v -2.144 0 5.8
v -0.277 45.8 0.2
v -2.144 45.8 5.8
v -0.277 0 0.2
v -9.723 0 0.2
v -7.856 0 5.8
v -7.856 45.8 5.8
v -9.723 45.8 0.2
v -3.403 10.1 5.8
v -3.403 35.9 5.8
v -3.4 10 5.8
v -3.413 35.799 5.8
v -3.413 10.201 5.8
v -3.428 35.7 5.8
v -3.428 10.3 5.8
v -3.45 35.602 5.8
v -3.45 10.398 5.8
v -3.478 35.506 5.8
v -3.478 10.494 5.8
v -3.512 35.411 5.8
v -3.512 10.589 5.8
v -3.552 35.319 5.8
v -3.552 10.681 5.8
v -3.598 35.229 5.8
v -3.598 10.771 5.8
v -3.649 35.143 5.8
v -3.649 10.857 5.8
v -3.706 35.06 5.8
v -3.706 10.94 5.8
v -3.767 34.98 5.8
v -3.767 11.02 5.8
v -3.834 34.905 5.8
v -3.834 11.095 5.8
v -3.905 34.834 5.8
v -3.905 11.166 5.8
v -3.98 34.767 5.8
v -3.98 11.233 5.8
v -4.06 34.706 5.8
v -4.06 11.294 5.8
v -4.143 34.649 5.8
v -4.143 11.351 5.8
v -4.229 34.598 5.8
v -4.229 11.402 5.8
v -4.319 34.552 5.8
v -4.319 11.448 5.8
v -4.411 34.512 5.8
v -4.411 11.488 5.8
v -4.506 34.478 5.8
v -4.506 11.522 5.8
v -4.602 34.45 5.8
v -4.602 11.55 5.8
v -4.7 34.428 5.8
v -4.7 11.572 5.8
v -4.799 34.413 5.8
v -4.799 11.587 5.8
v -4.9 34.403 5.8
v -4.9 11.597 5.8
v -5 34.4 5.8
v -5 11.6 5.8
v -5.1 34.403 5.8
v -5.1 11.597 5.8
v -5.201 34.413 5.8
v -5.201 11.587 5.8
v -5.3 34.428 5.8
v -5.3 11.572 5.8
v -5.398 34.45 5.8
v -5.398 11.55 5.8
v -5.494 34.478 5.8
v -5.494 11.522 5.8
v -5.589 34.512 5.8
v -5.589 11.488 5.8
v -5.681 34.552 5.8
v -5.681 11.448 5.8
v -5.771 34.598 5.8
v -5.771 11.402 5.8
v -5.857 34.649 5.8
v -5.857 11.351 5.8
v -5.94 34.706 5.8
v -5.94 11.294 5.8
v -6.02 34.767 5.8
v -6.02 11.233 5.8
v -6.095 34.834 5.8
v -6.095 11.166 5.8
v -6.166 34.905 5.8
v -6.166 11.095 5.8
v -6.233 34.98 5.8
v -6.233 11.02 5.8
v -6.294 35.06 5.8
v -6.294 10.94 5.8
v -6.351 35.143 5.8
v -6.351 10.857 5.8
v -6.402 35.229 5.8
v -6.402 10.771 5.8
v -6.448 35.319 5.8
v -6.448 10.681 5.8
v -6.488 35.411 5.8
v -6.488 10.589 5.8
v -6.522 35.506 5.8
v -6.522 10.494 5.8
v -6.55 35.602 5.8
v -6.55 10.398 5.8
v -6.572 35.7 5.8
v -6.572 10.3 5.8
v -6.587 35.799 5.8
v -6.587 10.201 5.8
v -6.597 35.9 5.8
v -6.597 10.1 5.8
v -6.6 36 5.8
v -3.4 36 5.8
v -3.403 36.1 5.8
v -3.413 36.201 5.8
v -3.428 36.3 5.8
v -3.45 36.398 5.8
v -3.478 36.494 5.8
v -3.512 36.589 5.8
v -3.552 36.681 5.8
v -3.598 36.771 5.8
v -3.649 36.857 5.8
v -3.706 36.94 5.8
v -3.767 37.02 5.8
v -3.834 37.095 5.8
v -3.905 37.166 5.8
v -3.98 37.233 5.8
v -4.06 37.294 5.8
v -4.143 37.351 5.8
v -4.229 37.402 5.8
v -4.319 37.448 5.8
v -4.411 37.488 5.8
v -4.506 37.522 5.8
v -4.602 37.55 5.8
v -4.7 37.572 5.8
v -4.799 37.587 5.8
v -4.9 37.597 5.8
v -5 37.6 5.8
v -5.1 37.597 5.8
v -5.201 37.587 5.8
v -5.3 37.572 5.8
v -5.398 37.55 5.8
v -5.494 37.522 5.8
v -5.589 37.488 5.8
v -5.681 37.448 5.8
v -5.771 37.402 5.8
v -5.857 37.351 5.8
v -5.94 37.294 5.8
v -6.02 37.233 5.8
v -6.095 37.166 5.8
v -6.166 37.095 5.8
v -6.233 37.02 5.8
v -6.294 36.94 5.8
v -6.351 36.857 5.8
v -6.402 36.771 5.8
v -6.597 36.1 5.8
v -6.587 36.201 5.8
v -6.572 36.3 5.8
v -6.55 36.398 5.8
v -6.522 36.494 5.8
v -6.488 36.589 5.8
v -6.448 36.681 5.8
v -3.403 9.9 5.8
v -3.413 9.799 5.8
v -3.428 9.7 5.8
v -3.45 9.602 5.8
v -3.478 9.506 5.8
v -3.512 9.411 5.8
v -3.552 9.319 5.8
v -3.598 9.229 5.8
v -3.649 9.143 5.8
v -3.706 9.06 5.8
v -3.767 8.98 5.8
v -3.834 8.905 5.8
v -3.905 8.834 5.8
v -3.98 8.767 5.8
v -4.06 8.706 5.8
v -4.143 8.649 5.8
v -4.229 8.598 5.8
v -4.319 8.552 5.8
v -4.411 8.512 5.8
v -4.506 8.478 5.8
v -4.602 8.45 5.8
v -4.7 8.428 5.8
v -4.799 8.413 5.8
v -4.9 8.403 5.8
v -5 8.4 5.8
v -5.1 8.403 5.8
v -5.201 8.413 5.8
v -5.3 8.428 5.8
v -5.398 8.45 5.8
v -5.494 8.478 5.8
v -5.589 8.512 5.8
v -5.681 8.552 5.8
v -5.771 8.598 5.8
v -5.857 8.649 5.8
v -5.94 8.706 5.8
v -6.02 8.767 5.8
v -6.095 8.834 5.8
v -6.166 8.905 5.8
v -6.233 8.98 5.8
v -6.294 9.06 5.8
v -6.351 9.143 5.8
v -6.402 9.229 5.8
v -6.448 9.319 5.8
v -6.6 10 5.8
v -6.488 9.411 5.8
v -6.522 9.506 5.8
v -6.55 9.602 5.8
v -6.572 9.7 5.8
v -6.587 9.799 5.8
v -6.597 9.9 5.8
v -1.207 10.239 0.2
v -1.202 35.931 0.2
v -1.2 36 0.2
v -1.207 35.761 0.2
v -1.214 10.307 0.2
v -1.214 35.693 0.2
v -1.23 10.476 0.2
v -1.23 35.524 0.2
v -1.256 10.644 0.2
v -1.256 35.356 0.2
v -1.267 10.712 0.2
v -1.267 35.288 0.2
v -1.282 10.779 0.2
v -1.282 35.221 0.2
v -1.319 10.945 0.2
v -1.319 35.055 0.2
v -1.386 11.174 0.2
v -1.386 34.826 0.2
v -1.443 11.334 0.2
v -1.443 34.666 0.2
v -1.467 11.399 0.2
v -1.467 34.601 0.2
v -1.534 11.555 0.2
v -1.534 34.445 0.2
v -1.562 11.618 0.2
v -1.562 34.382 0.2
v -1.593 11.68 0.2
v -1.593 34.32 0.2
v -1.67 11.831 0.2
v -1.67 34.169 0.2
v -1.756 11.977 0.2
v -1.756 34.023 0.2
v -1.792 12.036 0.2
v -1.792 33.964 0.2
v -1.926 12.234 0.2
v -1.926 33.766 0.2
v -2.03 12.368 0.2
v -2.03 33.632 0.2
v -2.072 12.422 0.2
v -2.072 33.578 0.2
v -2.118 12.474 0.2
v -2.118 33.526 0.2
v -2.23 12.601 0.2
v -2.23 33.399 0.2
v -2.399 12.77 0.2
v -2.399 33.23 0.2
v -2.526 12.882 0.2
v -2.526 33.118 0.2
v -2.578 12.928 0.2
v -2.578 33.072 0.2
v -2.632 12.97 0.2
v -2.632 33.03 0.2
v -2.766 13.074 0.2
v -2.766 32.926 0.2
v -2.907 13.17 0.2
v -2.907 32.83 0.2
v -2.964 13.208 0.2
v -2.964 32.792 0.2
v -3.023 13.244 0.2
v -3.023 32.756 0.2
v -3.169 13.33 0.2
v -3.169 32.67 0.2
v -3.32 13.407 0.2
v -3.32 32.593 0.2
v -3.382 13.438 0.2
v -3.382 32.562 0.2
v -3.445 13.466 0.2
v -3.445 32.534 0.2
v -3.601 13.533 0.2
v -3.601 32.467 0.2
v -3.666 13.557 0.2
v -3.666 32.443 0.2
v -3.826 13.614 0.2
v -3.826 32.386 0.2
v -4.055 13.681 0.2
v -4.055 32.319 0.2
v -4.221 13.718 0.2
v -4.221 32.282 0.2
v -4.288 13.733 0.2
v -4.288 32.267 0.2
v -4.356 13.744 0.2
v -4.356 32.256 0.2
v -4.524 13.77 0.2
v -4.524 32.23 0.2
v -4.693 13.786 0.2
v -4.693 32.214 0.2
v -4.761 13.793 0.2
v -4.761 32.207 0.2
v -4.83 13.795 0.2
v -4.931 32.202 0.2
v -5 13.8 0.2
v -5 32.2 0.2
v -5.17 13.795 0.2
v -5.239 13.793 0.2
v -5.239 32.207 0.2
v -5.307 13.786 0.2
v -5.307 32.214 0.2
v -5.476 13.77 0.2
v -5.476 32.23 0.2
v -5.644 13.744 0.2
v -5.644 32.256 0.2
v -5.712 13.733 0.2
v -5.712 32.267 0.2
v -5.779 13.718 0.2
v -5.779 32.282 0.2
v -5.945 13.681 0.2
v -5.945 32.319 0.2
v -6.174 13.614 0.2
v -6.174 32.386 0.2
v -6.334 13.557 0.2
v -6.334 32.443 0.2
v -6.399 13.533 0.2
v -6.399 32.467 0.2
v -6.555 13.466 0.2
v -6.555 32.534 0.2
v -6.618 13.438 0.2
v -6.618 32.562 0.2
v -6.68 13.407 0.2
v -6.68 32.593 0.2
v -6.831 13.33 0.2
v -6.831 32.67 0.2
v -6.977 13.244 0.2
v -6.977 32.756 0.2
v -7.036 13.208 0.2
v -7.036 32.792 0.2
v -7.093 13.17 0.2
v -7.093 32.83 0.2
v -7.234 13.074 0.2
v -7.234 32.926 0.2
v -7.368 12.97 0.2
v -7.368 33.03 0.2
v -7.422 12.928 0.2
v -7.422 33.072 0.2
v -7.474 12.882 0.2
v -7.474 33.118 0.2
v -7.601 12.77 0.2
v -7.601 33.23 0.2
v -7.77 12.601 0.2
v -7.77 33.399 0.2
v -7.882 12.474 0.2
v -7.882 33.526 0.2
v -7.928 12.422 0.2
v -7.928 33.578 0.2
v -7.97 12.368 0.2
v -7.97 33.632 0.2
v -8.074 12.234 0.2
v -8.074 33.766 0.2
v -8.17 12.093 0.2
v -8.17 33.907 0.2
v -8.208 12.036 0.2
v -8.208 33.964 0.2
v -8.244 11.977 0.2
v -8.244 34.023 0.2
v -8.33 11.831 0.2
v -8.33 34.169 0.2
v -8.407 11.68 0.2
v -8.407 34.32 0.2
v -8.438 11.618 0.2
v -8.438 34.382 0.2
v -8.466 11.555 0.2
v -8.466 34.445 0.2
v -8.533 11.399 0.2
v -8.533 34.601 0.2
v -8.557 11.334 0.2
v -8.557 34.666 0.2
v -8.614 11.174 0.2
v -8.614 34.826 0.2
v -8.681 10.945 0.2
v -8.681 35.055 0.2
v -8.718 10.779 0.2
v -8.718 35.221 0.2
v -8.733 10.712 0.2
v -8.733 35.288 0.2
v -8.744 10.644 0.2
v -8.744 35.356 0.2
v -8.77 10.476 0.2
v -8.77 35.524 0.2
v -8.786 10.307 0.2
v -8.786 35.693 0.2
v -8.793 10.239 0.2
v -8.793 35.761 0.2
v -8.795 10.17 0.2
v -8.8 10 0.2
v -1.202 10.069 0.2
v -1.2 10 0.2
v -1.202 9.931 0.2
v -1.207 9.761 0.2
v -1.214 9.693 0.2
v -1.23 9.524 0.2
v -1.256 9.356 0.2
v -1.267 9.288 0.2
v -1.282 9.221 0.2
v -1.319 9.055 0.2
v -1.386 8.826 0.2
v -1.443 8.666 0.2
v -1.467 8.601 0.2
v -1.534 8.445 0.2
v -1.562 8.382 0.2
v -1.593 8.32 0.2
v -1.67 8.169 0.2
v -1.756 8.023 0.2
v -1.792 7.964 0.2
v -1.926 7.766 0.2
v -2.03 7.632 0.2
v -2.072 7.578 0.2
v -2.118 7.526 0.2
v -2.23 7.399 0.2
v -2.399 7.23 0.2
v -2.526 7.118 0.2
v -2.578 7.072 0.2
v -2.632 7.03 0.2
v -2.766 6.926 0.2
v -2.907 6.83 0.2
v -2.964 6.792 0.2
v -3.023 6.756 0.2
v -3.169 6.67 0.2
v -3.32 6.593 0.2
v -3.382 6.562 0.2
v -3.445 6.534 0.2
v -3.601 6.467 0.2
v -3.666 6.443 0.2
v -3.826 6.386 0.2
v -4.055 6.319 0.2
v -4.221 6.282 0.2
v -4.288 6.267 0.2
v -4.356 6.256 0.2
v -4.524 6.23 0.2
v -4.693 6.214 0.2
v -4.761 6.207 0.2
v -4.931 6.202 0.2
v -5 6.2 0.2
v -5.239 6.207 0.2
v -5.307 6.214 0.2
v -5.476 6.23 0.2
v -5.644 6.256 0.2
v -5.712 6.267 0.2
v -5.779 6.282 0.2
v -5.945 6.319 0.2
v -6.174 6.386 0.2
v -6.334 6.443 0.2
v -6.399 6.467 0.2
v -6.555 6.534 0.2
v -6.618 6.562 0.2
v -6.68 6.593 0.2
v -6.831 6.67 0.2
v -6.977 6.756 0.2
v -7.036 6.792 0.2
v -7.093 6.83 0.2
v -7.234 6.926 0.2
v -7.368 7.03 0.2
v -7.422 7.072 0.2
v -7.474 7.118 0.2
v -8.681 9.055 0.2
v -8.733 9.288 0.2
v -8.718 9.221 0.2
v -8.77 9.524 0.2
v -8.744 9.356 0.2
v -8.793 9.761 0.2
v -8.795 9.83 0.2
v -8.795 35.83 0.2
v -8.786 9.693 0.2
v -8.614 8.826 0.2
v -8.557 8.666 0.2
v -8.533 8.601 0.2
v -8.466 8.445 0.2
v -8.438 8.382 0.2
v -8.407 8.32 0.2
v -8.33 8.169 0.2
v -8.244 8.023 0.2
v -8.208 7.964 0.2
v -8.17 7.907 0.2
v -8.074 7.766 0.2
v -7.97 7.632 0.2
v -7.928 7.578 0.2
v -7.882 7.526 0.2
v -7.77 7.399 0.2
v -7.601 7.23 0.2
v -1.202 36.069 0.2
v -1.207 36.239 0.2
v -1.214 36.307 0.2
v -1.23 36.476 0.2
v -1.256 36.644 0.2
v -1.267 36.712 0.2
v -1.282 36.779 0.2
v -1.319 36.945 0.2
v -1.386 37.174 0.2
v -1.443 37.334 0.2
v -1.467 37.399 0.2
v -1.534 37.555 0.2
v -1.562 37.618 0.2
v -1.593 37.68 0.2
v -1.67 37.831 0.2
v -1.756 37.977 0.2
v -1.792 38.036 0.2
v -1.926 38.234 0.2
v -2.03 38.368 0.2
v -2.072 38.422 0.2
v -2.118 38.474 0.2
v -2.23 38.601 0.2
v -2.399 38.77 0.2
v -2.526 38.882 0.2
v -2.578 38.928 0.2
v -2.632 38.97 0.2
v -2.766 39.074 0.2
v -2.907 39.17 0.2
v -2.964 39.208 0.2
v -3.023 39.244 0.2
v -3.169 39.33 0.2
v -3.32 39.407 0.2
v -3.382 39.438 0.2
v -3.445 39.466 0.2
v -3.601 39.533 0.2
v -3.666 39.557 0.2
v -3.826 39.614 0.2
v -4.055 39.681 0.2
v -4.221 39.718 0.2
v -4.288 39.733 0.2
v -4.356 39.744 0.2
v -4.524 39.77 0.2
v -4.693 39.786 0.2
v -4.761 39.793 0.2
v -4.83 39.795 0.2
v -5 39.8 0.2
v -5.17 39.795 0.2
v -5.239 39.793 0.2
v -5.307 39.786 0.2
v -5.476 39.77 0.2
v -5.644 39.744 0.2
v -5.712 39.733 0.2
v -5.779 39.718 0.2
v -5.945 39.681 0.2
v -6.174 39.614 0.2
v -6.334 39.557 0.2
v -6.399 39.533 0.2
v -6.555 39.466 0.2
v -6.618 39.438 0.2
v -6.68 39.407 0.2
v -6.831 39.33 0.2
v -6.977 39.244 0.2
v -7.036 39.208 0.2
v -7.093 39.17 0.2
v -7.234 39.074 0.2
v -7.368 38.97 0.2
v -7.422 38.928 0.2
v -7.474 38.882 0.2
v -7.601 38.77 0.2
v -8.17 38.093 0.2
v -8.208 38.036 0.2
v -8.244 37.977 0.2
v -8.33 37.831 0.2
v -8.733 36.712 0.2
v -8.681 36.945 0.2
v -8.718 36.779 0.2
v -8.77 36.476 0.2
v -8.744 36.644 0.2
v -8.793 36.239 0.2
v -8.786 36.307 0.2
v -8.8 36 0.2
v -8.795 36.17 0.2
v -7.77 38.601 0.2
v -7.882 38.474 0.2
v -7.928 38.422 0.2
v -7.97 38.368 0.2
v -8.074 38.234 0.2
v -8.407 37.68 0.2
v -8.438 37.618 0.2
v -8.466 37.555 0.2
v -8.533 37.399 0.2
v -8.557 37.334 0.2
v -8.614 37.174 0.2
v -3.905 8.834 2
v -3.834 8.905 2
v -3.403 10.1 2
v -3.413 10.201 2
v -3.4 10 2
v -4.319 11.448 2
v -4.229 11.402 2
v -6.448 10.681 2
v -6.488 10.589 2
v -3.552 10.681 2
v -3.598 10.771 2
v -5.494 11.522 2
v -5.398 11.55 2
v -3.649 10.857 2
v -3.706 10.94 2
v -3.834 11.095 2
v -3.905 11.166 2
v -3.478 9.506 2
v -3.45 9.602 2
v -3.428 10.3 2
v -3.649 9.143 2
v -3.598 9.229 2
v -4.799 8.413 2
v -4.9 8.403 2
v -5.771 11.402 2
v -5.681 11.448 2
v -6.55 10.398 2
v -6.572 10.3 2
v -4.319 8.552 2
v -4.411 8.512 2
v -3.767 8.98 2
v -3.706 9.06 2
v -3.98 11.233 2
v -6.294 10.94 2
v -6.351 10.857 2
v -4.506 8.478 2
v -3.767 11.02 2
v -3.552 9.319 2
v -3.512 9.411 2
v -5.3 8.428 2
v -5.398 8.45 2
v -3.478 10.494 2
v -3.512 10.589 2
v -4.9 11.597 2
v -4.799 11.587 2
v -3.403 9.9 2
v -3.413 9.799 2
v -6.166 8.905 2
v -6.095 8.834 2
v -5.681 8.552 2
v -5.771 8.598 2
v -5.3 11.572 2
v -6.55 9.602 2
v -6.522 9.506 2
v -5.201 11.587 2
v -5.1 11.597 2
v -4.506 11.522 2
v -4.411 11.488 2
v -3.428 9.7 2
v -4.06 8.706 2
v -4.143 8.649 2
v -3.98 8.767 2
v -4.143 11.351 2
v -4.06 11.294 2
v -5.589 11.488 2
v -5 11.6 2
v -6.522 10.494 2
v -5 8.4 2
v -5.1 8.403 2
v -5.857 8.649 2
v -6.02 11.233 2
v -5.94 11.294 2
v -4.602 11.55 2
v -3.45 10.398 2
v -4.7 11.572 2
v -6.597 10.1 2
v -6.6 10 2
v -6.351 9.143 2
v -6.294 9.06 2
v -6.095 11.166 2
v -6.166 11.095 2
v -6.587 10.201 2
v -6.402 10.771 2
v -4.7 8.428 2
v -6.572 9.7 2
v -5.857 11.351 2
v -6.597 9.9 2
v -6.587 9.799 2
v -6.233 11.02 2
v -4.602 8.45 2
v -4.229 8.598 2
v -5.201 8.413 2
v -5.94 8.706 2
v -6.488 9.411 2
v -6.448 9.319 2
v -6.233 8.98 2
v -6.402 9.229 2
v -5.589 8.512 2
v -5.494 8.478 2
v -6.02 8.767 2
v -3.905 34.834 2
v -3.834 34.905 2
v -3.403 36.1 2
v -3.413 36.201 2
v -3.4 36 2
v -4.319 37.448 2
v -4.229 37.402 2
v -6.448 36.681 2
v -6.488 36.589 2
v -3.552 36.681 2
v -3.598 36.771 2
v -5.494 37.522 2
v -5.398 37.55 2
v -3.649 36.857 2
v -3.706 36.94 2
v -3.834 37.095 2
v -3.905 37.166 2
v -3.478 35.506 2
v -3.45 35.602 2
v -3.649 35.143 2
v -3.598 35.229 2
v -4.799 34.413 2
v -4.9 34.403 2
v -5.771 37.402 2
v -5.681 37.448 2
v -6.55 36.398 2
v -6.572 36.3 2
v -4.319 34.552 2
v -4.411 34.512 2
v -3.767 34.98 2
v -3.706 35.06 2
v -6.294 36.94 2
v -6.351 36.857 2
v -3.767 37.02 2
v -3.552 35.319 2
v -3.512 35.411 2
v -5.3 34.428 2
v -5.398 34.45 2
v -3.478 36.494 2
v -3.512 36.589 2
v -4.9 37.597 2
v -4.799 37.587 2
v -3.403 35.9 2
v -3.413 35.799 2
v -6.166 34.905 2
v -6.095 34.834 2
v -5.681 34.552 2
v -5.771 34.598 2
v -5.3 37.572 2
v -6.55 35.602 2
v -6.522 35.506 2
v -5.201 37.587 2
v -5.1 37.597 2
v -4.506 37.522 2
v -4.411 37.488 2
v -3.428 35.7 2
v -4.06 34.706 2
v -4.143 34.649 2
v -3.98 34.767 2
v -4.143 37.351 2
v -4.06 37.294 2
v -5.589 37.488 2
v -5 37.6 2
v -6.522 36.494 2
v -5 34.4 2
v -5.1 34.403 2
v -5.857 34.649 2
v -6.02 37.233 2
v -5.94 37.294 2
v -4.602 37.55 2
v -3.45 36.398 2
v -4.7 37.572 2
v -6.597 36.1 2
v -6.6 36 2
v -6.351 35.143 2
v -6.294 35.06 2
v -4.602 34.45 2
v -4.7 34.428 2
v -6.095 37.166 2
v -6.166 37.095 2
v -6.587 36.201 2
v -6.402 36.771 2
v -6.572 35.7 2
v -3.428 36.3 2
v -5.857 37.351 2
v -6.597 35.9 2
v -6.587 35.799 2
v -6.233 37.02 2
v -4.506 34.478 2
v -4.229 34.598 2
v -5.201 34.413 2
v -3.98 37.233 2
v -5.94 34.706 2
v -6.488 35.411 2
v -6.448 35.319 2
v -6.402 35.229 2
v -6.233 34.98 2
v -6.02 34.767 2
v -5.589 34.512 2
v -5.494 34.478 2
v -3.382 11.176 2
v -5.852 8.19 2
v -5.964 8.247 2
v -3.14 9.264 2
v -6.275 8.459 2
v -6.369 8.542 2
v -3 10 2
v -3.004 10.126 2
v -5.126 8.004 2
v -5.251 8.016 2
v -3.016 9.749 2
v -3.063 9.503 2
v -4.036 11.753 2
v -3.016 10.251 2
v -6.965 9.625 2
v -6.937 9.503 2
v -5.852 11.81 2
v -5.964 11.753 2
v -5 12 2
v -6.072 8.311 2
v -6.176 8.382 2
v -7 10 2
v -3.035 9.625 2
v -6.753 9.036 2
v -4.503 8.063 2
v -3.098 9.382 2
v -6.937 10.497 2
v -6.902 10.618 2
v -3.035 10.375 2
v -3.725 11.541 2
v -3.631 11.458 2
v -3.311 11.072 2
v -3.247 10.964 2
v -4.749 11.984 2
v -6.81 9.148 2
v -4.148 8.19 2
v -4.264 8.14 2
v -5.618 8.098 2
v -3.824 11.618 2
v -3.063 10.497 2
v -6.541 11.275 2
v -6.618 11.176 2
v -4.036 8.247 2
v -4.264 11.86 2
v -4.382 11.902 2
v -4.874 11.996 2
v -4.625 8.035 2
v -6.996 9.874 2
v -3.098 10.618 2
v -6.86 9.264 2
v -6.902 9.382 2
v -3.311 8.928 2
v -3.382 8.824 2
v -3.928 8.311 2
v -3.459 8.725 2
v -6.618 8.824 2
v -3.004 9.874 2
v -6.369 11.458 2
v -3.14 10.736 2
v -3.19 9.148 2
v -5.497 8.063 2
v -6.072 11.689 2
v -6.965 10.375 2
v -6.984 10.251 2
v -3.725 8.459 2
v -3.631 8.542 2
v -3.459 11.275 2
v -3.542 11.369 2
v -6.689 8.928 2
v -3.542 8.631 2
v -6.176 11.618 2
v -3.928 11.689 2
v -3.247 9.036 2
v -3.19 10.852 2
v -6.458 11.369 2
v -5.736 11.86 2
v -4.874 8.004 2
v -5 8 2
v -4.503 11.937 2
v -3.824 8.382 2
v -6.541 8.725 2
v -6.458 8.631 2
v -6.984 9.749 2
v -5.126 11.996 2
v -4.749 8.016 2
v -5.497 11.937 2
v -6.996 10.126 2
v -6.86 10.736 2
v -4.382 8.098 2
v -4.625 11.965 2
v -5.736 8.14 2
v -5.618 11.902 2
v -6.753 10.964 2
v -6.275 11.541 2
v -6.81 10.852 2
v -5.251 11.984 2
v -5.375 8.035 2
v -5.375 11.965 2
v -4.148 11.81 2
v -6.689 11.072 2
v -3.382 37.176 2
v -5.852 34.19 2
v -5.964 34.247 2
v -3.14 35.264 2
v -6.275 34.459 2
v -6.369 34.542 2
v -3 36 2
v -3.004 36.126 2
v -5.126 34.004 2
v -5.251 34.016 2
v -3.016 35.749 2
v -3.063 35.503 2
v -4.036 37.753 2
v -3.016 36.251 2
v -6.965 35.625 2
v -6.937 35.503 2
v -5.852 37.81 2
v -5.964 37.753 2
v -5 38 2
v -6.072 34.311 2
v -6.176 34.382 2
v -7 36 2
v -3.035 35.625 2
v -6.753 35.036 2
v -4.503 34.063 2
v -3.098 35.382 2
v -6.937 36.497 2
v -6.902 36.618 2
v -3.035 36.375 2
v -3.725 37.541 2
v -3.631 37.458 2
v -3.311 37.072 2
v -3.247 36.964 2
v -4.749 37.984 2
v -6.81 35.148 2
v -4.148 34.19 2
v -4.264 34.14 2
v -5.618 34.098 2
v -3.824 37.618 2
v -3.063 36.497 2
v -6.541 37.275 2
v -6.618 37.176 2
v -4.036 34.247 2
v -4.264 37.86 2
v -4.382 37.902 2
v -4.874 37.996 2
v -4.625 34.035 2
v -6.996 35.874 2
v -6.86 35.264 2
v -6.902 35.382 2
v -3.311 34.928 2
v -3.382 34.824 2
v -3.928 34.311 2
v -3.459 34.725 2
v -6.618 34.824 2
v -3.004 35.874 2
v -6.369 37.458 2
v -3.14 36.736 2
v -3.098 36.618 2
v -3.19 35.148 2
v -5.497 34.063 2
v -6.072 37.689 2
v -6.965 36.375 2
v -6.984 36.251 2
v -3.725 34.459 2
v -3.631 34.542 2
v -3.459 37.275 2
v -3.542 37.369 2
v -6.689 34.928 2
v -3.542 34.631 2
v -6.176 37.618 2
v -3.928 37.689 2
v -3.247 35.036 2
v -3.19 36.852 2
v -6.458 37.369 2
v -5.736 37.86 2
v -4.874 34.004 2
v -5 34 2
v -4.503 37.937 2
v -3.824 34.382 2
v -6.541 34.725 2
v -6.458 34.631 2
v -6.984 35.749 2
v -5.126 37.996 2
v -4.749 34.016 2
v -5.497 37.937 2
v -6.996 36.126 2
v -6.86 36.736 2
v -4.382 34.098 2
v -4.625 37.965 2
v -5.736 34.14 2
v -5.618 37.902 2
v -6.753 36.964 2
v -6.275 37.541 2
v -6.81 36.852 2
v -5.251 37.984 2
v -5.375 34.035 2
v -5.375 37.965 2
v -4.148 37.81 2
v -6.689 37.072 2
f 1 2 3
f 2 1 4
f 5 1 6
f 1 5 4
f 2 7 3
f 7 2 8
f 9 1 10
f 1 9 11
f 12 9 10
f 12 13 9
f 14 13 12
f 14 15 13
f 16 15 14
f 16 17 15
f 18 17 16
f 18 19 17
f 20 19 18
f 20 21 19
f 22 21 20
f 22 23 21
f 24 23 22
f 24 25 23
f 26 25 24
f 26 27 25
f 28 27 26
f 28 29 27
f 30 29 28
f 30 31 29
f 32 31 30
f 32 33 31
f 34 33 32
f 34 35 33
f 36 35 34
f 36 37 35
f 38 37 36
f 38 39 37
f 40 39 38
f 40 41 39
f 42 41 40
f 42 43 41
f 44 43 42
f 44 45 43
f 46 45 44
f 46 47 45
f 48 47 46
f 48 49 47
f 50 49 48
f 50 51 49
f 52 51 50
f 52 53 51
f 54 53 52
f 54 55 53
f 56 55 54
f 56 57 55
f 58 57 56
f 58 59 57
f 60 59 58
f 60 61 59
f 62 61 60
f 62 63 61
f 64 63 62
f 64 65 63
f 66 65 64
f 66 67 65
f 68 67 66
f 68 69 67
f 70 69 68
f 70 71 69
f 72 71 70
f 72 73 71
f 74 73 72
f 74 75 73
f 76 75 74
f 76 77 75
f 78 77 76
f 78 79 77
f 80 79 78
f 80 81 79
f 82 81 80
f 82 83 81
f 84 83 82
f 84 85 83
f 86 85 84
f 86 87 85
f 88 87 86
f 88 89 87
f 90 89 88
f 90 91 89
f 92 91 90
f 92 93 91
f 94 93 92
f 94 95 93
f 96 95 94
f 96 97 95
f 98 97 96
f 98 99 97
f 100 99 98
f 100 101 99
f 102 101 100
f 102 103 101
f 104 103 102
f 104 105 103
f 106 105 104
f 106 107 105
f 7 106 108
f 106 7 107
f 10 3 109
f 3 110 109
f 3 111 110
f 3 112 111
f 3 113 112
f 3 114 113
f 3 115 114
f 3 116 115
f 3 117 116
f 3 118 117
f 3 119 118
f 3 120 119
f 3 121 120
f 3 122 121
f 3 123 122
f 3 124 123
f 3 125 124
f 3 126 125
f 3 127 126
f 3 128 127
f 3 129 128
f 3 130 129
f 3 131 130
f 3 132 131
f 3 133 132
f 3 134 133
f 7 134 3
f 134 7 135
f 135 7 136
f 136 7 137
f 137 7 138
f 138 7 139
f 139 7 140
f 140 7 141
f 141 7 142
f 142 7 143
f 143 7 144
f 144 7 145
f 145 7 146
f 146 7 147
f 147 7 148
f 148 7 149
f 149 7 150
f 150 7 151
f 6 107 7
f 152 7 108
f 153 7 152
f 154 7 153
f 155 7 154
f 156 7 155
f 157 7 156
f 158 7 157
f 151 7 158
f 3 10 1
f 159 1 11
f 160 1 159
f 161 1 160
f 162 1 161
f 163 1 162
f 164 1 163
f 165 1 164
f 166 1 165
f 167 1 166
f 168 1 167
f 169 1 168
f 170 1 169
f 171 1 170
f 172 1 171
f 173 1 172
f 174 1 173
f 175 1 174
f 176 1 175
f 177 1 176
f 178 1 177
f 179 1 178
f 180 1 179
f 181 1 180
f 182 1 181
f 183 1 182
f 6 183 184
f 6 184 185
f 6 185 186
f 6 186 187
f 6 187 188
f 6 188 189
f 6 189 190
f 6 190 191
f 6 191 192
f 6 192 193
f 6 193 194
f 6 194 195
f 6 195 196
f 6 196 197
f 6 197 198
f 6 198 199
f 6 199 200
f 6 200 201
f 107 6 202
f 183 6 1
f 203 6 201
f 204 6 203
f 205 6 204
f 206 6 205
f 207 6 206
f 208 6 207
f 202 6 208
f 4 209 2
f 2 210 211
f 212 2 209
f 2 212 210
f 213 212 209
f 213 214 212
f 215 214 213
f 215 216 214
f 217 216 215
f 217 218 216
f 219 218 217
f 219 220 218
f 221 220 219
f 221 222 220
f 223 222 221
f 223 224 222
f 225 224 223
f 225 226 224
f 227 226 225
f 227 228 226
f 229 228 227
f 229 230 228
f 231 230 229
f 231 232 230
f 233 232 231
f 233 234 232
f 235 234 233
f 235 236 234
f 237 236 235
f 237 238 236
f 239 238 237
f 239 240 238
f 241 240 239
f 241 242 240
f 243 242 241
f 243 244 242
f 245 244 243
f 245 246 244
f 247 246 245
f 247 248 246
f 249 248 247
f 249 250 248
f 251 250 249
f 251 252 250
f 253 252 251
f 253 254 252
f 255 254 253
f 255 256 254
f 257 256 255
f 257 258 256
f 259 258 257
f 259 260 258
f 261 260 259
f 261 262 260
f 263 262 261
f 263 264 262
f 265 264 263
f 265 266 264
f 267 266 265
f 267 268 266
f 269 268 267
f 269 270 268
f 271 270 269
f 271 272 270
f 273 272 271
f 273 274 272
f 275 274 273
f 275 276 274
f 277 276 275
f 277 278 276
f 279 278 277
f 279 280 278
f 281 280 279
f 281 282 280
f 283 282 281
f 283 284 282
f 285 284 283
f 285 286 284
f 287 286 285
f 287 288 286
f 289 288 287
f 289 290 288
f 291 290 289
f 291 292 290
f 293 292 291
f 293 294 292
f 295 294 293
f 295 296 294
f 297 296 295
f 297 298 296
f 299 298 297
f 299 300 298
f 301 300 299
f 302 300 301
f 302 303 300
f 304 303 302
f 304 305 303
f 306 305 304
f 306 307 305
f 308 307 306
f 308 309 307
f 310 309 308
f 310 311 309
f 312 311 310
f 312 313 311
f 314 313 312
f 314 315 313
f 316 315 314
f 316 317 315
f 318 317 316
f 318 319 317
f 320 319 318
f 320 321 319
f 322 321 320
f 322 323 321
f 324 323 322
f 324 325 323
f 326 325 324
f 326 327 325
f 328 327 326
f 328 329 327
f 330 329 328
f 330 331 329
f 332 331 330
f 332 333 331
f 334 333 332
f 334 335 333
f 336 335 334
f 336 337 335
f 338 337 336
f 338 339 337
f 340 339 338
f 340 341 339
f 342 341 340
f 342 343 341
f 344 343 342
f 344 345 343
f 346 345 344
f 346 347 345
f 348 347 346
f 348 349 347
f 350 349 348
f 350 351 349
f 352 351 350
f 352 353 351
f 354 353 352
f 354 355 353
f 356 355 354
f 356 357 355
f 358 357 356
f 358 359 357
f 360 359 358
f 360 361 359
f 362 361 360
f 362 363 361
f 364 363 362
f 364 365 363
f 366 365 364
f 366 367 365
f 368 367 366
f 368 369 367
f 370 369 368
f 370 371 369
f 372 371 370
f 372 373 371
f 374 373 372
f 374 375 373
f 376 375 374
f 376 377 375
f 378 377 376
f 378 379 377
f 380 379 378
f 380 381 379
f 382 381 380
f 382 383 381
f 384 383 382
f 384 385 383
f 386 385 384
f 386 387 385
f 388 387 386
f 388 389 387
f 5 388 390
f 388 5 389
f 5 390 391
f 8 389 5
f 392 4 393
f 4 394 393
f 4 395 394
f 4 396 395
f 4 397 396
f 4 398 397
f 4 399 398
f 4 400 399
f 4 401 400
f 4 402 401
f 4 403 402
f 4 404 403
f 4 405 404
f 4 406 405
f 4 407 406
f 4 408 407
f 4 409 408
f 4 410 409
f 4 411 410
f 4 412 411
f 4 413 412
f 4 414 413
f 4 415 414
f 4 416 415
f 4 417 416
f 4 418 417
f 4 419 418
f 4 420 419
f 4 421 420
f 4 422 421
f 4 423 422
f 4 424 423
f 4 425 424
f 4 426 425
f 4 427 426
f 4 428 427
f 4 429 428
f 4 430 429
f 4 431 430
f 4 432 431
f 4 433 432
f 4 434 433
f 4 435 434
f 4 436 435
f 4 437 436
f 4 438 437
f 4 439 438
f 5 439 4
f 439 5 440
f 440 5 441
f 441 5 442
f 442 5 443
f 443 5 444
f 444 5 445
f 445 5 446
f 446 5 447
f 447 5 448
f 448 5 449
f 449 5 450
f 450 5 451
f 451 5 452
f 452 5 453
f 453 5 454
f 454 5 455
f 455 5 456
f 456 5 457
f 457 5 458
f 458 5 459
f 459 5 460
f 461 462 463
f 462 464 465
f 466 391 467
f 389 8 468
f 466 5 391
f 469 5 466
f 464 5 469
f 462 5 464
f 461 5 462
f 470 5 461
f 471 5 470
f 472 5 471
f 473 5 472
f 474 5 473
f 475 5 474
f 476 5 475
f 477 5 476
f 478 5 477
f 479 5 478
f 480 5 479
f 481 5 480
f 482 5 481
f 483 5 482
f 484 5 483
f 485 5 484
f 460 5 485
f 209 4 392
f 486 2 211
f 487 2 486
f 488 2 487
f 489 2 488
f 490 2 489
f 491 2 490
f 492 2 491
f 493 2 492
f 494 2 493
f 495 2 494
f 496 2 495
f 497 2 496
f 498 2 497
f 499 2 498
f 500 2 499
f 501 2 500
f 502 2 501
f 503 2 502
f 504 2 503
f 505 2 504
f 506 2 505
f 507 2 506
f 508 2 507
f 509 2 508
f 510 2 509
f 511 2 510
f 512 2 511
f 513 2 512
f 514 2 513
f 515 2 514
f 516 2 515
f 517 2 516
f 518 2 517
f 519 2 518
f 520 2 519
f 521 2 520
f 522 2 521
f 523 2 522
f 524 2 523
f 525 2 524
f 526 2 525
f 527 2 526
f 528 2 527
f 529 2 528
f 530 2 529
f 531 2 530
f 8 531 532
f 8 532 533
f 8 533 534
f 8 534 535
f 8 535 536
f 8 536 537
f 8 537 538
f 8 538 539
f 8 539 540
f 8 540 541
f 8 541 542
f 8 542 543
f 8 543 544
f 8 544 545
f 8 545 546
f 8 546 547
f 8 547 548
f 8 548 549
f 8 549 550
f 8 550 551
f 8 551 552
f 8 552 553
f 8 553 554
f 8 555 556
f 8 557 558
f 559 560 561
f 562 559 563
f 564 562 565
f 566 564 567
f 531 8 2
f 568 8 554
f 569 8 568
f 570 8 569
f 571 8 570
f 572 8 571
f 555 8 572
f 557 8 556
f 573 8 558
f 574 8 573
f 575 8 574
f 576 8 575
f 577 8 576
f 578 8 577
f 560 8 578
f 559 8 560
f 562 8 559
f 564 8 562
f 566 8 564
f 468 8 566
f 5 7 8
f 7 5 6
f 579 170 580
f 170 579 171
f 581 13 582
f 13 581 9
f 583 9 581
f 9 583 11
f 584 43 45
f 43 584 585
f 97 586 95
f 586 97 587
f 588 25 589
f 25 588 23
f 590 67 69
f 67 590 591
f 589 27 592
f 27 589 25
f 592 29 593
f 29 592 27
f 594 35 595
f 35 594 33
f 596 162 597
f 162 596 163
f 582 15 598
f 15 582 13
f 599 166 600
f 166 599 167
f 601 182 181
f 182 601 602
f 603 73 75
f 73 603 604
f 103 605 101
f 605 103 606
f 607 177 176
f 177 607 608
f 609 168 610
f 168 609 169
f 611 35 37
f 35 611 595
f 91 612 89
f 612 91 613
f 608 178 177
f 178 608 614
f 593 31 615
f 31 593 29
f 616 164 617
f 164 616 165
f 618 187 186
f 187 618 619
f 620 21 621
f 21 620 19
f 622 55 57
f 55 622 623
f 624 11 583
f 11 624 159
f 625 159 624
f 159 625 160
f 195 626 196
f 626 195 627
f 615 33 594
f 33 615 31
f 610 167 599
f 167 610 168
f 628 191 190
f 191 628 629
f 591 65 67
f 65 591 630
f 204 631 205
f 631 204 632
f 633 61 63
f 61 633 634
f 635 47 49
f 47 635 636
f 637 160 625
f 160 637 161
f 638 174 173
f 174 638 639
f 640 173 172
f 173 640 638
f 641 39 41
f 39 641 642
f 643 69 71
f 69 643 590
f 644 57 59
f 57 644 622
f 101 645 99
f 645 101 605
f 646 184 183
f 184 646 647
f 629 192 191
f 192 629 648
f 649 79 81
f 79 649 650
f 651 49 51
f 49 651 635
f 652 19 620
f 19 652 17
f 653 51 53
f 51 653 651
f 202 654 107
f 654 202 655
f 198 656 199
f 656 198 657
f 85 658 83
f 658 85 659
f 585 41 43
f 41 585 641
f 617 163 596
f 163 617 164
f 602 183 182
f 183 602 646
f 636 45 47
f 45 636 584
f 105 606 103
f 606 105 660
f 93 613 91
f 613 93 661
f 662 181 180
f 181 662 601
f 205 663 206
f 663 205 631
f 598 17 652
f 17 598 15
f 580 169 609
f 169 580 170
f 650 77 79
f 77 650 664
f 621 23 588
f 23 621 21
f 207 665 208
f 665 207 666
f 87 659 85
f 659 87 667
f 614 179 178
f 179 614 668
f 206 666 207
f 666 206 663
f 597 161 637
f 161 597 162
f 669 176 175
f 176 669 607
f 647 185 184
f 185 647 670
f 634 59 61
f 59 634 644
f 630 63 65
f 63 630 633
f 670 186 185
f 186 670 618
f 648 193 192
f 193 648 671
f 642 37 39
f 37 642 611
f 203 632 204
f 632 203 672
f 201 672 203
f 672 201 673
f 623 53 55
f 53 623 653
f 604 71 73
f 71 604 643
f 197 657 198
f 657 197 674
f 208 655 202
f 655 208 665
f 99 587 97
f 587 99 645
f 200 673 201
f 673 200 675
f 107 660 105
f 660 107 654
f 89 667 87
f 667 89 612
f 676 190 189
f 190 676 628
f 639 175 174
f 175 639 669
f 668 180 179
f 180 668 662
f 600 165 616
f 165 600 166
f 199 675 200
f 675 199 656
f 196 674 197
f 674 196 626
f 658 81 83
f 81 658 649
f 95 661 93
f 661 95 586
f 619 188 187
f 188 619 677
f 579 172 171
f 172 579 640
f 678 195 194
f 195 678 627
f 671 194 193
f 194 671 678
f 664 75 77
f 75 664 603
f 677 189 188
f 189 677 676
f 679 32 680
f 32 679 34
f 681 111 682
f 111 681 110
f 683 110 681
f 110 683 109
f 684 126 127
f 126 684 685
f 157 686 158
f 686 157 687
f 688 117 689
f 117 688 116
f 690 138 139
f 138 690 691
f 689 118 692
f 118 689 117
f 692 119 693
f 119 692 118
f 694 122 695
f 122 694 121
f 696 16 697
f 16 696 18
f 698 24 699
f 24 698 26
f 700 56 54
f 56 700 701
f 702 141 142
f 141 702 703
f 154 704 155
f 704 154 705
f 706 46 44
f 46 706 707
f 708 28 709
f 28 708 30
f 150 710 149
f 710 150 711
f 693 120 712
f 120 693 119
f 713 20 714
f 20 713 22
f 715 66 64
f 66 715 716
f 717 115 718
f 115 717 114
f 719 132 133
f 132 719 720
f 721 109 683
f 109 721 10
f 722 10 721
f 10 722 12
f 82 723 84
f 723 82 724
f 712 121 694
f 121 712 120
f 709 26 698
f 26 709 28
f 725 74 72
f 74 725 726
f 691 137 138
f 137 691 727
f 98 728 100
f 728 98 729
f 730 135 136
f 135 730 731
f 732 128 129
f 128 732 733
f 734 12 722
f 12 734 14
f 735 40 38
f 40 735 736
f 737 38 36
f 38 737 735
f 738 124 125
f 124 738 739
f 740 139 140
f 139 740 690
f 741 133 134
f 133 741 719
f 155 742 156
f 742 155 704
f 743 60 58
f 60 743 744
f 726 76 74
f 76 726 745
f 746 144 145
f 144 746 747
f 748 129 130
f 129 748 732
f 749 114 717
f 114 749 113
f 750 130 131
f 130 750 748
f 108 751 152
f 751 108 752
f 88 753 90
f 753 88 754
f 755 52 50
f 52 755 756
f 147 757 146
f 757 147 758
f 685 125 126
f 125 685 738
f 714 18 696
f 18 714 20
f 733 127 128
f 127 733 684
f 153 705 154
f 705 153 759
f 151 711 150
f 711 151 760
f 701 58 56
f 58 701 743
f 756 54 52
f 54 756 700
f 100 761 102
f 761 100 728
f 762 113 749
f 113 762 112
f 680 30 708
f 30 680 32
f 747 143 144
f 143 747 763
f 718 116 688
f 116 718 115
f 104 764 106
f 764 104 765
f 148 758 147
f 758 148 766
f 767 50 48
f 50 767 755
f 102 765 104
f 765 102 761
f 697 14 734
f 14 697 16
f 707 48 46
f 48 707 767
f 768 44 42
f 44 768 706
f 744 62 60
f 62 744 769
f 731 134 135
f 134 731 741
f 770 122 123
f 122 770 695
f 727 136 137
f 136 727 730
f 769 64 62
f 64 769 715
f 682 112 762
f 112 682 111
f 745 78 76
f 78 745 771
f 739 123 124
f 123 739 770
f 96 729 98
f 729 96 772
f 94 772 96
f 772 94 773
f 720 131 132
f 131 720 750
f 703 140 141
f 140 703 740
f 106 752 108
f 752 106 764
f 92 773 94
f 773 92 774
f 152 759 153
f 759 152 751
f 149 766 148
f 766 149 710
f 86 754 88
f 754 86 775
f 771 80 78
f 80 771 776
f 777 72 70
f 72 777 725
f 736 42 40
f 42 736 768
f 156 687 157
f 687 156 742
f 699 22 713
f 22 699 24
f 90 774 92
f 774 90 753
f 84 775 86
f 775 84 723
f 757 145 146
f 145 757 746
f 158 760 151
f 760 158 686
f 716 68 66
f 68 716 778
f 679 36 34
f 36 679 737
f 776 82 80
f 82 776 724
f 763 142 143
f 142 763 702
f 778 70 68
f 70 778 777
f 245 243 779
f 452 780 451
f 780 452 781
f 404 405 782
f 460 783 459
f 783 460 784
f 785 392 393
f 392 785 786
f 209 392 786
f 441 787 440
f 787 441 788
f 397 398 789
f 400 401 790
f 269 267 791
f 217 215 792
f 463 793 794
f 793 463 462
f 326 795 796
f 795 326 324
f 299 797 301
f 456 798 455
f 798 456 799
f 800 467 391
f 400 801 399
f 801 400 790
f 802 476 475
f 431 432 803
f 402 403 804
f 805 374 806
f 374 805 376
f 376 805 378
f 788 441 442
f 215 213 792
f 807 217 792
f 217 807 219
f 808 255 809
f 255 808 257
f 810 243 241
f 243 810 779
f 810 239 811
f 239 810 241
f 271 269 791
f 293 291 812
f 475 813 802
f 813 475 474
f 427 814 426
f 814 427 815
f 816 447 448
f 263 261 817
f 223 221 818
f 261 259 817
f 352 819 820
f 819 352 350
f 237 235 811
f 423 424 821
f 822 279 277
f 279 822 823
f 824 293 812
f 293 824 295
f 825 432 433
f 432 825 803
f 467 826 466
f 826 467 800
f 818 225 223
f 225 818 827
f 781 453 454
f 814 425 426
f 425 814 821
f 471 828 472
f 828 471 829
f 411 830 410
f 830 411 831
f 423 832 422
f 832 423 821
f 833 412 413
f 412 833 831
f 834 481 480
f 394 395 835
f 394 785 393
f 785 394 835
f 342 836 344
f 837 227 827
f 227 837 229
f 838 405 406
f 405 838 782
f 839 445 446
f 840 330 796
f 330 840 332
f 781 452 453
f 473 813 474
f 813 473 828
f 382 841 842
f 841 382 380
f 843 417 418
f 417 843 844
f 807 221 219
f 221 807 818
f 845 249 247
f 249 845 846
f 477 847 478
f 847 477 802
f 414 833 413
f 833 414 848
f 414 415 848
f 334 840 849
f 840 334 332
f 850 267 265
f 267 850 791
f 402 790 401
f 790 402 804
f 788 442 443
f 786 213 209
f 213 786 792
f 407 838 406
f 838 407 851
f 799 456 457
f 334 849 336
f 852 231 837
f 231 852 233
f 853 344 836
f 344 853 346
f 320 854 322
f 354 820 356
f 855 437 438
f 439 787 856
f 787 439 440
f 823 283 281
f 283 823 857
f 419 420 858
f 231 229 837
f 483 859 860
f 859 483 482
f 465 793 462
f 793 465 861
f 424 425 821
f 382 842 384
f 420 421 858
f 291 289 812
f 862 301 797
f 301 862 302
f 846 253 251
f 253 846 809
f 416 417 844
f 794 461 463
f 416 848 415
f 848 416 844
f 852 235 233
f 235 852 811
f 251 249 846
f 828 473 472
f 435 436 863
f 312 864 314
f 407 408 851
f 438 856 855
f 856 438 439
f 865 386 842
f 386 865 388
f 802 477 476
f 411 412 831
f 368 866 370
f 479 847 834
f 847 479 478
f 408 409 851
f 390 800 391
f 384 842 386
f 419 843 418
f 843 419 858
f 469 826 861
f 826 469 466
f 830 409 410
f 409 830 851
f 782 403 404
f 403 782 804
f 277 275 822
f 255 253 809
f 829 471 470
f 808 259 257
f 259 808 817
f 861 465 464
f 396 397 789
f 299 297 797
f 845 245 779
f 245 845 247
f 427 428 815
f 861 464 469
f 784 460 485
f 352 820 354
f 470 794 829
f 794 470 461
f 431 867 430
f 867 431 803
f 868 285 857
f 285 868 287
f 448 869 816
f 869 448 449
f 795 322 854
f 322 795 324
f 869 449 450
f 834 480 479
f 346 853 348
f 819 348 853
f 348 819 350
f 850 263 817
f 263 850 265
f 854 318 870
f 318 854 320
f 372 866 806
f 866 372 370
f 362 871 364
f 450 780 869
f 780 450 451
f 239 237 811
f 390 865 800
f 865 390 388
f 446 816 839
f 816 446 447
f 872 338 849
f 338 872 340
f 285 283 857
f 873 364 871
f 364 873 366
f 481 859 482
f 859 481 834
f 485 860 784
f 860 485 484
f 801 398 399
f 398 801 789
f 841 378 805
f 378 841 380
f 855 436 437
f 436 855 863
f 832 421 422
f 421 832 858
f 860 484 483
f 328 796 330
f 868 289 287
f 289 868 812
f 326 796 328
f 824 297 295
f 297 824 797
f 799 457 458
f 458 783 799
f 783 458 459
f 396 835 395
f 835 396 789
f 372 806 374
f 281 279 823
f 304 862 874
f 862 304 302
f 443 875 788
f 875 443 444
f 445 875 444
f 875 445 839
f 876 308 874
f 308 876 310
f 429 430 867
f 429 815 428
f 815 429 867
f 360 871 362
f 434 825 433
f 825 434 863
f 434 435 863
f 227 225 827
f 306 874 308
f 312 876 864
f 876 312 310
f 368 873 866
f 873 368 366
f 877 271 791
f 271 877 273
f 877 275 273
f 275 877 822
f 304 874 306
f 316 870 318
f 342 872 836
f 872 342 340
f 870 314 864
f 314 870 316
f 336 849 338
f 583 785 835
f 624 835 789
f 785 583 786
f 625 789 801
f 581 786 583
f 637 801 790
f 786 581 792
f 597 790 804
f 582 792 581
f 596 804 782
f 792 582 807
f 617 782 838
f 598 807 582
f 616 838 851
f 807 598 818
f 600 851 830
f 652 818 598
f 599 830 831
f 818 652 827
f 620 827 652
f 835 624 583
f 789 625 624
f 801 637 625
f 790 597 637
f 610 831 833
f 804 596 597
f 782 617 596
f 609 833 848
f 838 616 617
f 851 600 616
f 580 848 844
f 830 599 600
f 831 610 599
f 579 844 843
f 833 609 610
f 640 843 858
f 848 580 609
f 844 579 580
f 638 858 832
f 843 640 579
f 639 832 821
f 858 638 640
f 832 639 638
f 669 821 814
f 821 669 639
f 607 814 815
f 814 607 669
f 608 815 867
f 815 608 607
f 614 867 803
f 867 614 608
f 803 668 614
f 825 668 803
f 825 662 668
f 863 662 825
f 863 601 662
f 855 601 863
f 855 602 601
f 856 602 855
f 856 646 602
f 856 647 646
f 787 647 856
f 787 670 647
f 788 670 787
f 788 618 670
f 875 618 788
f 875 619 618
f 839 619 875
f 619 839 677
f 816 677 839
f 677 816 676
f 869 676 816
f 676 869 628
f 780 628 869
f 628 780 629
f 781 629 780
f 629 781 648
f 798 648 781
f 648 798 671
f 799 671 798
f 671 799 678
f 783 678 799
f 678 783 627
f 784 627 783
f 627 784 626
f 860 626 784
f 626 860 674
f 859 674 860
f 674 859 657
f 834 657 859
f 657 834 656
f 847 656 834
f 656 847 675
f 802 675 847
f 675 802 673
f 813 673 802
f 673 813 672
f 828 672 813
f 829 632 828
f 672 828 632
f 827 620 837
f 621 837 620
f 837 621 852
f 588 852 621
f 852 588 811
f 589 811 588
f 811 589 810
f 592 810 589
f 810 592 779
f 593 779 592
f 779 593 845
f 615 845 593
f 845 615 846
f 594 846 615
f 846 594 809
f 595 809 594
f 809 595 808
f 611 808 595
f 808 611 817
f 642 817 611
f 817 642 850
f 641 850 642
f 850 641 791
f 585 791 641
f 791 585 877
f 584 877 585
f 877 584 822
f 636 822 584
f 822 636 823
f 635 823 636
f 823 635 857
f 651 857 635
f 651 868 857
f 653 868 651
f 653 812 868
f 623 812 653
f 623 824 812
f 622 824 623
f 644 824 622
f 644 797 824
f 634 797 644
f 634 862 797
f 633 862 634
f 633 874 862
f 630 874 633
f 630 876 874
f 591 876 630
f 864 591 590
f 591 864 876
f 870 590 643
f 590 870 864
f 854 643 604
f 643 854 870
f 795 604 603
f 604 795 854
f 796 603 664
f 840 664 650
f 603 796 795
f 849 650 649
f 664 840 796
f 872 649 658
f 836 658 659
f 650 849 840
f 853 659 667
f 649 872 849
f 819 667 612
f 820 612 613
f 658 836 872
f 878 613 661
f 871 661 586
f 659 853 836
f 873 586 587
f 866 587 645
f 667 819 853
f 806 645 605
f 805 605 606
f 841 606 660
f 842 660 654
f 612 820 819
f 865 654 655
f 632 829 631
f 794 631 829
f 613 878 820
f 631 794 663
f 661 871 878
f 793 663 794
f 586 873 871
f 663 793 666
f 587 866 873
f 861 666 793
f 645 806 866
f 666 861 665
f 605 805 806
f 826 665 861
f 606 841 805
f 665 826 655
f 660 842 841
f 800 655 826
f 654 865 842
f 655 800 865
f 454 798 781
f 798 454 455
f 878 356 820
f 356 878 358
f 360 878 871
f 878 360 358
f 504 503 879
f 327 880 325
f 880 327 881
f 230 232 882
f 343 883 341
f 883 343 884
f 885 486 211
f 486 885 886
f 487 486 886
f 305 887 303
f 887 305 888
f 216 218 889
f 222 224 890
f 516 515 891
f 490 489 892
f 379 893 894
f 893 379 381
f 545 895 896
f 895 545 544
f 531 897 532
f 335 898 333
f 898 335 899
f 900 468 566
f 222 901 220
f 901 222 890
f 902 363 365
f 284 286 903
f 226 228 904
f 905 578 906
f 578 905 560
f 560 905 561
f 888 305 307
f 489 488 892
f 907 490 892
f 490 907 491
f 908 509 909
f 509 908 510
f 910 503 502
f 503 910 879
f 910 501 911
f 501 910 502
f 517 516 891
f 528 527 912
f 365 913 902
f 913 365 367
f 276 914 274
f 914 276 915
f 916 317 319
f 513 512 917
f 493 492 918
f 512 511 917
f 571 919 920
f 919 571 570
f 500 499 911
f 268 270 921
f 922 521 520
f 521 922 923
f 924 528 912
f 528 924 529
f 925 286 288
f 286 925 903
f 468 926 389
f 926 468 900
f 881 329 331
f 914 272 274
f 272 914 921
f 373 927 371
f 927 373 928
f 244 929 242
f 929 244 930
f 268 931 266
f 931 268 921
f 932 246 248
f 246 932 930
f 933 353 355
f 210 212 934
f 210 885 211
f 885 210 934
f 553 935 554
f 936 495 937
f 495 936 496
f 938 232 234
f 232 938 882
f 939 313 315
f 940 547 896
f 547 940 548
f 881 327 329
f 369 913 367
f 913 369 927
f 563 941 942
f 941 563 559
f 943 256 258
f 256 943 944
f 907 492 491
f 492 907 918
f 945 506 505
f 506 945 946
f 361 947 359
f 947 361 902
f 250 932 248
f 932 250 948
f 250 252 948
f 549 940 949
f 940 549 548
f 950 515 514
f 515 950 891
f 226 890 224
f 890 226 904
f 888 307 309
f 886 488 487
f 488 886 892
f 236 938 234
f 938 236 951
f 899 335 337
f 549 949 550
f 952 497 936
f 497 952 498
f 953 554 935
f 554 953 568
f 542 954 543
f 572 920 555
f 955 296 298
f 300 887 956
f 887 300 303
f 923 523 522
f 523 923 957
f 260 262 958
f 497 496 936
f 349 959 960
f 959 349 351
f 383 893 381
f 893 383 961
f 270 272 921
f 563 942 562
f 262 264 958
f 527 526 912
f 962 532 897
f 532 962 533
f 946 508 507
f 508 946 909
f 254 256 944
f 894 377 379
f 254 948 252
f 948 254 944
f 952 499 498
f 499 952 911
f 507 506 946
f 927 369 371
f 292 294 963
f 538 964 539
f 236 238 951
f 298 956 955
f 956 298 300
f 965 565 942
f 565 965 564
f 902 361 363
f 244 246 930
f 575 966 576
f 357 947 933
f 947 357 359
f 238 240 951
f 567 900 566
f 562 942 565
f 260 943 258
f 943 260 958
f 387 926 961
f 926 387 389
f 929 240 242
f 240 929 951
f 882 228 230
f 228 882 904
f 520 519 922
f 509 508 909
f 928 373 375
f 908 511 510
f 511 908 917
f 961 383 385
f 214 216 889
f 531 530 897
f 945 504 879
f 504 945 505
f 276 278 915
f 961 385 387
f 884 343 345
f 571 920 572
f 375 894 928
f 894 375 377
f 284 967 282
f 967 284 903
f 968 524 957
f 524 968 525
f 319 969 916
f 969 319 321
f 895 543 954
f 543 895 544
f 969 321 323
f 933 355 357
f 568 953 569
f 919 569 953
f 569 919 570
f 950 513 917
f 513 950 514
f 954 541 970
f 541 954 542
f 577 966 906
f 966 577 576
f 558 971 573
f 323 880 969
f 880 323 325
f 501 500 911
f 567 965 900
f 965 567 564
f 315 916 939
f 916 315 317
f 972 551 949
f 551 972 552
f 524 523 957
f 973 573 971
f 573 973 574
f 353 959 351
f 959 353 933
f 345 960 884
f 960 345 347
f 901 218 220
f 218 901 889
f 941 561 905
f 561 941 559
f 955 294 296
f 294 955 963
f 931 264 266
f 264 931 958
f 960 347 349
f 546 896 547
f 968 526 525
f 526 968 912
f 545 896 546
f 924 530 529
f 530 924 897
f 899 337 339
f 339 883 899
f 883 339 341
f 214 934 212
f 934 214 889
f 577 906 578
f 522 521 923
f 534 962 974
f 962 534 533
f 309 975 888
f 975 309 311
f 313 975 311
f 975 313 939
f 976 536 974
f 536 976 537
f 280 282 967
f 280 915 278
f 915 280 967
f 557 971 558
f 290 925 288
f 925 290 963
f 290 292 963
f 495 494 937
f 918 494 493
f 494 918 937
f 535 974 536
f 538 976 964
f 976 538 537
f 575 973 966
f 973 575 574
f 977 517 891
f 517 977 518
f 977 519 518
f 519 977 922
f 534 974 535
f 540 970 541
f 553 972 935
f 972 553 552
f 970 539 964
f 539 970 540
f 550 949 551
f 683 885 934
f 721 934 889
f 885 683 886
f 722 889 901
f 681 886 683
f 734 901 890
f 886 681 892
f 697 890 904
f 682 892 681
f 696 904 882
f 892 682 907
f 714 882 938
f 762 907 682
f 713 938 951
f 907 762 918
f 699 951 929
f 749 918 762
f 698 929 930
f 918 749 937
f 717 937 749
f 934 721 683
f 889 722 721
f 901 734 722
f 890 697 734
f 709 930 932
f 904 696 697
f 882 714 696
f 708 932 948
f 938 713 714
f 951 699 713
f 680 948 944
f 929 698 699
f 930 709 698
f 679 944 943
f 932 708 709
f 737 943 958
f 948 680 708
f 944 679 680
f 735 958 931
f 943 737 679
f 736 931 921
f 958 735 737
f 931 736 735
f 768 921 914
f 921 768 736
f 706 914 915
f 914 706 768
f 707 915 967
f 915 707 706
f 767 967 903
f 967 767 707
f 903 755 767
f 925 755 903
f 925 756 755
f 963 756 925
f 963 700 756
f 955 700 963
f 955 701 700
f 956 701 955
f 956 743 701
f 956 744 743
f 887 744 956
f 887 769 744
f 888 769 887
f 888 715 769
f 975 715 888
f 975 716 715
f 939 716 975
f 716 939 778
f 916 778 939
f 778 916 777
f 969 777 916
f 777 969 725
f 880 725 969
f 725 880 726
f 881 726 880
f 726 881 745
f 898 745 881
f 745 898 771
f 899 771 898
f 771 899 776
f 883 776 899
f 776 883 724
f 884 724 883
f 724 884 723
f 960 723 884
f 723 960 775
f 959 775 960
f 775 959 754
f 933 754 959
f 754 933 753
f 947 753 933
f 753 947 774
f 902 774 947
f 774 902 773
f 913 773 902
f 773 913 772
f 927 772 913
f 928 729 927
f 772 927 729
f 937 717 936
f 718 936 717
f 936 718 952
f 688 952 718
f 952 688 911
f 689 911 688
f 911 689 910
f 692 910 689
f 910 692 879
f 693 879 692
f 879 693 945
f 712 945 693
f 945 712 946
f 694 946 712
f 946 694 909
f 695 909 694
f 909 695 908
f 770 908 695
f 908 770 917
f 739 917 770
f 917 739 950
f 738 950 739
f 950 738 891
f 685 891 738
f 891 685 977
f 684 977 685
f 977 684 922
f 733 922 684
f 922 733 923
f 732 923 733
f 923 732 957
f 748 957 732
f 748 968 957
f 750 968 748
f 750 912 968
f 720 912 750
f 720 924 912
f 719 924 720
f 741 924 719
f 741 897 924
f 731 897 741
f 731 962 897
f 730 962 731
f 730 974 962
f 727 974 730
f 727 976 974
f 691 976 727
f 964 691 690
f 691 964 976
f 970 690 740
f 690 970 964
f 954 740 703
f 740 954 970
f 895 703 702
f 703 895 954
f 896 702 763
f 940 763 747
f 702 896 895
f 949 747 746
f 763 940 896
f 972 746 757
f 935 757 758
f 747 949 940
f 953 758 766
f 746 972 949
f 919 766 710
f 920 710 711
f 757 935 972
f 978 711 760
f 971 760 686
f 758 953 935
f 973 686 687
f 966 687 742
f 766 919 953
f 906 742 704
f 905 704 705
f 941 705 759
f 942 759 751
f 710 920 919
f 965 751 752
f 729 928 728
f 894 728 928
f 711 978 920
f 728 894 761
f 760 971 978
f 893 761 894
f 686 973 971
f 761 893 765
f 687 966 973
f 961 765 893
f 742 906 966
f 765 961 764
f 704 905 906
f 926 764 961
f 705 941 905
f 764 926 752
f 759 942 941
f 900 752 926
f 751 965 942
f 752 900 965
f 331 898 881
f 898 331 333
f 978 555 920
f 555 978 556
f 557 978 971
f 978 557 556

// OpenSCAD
$fn = 100;
_width = 12;
_height = 50;
_thickness = 12;

module holder_corpus(_w, _h, _t, _offset = 0) {
    
    points = [
        [0, 0],
        [_w , 0],
        [_w - 2, _t],
        [2, _t],
        [0, 0]
    ];

    rotate([270, 180, 0])
    //translate([-13, -8, 0])
    linear_extrude(height = _h + _offset) {
        offset(r = _offset)
        polygon(points);
    }
}


module holder(_w, _h, _t, _o) {

    difference() {

        holder_corpus(_w, _h, _t, _o);

        color("red")
        translate([-_w/2, 10,  -1])
        cylinder(h=_t + 2, r=1.6, center=false);

        color("red")
        translate([-_w / 2, _h - 10, -1])
        cylinder(h=_t + 2, r=1.6, center=false);


        color("green")
        translate([-_w / 2, 10, -2])
        cylinder(h=4, r1=6, r2=2, center=false);

        color("green")
        translate([-_w / 2, _h - 10, -2])
        cylinder(h=4, r1=6, r2=2, center=false);
    }


}

module attachment() {

        color("green")
        translate([0, 0, 0])
        cube([_width, 4, _thickness], center=false);

    difference() {
    
        translate([0, 0, 0])
        cube([_width, _height, _thickness], center=false);

        color("red")
        translate([1, -1, _thickness / 2 - 0.1]) 
        rotate([0, 180, 0])
        holder_corpus(_width - 2, _height + 2, _thickness / 2, 0);
    
    }
}


module hook_cyl() {

    attachment();

    _hook_height = 40;

    translate([_width / 2, _height / 2, _thickness])
    cylinder(h=_hook_height, r= 5);

    translate([_width / 2, _height / 2, _thickness])
    cylinder(h=10, r1= 10, r2 = 5);

    translate([_width / 2, _height / 2, _hook_height + _thickness])
    cylinder(h=10, r1= 5, r2 = 10);
}


module hook() {

    attachment();

    _hook_height = 40;

    points = [
        [0, 0],
        [_height - 5, 0],
        [_height, 5],
        [_height, _hook_height - 5],
        [_height - 5, _hook_height],
        [_height - 10, _hook_height],
        [_height - 10, _hook_height-5],
        [_height - 7, _hook_height-5],
        [_height - 6, _hook_height-6],
        [_height - 6, 6],
        [_height - 7, 5],
        [0, 5]
    ];

    translate([0, 0, _thickness - 3])
    rotate([90, 0, 90])
    linear_extrude(height = _width) {
        polygon(points);
    }

}

//hook();

//attachment();

holder(_width - 2, _height - 4, _thickness / 2, -0.2);
